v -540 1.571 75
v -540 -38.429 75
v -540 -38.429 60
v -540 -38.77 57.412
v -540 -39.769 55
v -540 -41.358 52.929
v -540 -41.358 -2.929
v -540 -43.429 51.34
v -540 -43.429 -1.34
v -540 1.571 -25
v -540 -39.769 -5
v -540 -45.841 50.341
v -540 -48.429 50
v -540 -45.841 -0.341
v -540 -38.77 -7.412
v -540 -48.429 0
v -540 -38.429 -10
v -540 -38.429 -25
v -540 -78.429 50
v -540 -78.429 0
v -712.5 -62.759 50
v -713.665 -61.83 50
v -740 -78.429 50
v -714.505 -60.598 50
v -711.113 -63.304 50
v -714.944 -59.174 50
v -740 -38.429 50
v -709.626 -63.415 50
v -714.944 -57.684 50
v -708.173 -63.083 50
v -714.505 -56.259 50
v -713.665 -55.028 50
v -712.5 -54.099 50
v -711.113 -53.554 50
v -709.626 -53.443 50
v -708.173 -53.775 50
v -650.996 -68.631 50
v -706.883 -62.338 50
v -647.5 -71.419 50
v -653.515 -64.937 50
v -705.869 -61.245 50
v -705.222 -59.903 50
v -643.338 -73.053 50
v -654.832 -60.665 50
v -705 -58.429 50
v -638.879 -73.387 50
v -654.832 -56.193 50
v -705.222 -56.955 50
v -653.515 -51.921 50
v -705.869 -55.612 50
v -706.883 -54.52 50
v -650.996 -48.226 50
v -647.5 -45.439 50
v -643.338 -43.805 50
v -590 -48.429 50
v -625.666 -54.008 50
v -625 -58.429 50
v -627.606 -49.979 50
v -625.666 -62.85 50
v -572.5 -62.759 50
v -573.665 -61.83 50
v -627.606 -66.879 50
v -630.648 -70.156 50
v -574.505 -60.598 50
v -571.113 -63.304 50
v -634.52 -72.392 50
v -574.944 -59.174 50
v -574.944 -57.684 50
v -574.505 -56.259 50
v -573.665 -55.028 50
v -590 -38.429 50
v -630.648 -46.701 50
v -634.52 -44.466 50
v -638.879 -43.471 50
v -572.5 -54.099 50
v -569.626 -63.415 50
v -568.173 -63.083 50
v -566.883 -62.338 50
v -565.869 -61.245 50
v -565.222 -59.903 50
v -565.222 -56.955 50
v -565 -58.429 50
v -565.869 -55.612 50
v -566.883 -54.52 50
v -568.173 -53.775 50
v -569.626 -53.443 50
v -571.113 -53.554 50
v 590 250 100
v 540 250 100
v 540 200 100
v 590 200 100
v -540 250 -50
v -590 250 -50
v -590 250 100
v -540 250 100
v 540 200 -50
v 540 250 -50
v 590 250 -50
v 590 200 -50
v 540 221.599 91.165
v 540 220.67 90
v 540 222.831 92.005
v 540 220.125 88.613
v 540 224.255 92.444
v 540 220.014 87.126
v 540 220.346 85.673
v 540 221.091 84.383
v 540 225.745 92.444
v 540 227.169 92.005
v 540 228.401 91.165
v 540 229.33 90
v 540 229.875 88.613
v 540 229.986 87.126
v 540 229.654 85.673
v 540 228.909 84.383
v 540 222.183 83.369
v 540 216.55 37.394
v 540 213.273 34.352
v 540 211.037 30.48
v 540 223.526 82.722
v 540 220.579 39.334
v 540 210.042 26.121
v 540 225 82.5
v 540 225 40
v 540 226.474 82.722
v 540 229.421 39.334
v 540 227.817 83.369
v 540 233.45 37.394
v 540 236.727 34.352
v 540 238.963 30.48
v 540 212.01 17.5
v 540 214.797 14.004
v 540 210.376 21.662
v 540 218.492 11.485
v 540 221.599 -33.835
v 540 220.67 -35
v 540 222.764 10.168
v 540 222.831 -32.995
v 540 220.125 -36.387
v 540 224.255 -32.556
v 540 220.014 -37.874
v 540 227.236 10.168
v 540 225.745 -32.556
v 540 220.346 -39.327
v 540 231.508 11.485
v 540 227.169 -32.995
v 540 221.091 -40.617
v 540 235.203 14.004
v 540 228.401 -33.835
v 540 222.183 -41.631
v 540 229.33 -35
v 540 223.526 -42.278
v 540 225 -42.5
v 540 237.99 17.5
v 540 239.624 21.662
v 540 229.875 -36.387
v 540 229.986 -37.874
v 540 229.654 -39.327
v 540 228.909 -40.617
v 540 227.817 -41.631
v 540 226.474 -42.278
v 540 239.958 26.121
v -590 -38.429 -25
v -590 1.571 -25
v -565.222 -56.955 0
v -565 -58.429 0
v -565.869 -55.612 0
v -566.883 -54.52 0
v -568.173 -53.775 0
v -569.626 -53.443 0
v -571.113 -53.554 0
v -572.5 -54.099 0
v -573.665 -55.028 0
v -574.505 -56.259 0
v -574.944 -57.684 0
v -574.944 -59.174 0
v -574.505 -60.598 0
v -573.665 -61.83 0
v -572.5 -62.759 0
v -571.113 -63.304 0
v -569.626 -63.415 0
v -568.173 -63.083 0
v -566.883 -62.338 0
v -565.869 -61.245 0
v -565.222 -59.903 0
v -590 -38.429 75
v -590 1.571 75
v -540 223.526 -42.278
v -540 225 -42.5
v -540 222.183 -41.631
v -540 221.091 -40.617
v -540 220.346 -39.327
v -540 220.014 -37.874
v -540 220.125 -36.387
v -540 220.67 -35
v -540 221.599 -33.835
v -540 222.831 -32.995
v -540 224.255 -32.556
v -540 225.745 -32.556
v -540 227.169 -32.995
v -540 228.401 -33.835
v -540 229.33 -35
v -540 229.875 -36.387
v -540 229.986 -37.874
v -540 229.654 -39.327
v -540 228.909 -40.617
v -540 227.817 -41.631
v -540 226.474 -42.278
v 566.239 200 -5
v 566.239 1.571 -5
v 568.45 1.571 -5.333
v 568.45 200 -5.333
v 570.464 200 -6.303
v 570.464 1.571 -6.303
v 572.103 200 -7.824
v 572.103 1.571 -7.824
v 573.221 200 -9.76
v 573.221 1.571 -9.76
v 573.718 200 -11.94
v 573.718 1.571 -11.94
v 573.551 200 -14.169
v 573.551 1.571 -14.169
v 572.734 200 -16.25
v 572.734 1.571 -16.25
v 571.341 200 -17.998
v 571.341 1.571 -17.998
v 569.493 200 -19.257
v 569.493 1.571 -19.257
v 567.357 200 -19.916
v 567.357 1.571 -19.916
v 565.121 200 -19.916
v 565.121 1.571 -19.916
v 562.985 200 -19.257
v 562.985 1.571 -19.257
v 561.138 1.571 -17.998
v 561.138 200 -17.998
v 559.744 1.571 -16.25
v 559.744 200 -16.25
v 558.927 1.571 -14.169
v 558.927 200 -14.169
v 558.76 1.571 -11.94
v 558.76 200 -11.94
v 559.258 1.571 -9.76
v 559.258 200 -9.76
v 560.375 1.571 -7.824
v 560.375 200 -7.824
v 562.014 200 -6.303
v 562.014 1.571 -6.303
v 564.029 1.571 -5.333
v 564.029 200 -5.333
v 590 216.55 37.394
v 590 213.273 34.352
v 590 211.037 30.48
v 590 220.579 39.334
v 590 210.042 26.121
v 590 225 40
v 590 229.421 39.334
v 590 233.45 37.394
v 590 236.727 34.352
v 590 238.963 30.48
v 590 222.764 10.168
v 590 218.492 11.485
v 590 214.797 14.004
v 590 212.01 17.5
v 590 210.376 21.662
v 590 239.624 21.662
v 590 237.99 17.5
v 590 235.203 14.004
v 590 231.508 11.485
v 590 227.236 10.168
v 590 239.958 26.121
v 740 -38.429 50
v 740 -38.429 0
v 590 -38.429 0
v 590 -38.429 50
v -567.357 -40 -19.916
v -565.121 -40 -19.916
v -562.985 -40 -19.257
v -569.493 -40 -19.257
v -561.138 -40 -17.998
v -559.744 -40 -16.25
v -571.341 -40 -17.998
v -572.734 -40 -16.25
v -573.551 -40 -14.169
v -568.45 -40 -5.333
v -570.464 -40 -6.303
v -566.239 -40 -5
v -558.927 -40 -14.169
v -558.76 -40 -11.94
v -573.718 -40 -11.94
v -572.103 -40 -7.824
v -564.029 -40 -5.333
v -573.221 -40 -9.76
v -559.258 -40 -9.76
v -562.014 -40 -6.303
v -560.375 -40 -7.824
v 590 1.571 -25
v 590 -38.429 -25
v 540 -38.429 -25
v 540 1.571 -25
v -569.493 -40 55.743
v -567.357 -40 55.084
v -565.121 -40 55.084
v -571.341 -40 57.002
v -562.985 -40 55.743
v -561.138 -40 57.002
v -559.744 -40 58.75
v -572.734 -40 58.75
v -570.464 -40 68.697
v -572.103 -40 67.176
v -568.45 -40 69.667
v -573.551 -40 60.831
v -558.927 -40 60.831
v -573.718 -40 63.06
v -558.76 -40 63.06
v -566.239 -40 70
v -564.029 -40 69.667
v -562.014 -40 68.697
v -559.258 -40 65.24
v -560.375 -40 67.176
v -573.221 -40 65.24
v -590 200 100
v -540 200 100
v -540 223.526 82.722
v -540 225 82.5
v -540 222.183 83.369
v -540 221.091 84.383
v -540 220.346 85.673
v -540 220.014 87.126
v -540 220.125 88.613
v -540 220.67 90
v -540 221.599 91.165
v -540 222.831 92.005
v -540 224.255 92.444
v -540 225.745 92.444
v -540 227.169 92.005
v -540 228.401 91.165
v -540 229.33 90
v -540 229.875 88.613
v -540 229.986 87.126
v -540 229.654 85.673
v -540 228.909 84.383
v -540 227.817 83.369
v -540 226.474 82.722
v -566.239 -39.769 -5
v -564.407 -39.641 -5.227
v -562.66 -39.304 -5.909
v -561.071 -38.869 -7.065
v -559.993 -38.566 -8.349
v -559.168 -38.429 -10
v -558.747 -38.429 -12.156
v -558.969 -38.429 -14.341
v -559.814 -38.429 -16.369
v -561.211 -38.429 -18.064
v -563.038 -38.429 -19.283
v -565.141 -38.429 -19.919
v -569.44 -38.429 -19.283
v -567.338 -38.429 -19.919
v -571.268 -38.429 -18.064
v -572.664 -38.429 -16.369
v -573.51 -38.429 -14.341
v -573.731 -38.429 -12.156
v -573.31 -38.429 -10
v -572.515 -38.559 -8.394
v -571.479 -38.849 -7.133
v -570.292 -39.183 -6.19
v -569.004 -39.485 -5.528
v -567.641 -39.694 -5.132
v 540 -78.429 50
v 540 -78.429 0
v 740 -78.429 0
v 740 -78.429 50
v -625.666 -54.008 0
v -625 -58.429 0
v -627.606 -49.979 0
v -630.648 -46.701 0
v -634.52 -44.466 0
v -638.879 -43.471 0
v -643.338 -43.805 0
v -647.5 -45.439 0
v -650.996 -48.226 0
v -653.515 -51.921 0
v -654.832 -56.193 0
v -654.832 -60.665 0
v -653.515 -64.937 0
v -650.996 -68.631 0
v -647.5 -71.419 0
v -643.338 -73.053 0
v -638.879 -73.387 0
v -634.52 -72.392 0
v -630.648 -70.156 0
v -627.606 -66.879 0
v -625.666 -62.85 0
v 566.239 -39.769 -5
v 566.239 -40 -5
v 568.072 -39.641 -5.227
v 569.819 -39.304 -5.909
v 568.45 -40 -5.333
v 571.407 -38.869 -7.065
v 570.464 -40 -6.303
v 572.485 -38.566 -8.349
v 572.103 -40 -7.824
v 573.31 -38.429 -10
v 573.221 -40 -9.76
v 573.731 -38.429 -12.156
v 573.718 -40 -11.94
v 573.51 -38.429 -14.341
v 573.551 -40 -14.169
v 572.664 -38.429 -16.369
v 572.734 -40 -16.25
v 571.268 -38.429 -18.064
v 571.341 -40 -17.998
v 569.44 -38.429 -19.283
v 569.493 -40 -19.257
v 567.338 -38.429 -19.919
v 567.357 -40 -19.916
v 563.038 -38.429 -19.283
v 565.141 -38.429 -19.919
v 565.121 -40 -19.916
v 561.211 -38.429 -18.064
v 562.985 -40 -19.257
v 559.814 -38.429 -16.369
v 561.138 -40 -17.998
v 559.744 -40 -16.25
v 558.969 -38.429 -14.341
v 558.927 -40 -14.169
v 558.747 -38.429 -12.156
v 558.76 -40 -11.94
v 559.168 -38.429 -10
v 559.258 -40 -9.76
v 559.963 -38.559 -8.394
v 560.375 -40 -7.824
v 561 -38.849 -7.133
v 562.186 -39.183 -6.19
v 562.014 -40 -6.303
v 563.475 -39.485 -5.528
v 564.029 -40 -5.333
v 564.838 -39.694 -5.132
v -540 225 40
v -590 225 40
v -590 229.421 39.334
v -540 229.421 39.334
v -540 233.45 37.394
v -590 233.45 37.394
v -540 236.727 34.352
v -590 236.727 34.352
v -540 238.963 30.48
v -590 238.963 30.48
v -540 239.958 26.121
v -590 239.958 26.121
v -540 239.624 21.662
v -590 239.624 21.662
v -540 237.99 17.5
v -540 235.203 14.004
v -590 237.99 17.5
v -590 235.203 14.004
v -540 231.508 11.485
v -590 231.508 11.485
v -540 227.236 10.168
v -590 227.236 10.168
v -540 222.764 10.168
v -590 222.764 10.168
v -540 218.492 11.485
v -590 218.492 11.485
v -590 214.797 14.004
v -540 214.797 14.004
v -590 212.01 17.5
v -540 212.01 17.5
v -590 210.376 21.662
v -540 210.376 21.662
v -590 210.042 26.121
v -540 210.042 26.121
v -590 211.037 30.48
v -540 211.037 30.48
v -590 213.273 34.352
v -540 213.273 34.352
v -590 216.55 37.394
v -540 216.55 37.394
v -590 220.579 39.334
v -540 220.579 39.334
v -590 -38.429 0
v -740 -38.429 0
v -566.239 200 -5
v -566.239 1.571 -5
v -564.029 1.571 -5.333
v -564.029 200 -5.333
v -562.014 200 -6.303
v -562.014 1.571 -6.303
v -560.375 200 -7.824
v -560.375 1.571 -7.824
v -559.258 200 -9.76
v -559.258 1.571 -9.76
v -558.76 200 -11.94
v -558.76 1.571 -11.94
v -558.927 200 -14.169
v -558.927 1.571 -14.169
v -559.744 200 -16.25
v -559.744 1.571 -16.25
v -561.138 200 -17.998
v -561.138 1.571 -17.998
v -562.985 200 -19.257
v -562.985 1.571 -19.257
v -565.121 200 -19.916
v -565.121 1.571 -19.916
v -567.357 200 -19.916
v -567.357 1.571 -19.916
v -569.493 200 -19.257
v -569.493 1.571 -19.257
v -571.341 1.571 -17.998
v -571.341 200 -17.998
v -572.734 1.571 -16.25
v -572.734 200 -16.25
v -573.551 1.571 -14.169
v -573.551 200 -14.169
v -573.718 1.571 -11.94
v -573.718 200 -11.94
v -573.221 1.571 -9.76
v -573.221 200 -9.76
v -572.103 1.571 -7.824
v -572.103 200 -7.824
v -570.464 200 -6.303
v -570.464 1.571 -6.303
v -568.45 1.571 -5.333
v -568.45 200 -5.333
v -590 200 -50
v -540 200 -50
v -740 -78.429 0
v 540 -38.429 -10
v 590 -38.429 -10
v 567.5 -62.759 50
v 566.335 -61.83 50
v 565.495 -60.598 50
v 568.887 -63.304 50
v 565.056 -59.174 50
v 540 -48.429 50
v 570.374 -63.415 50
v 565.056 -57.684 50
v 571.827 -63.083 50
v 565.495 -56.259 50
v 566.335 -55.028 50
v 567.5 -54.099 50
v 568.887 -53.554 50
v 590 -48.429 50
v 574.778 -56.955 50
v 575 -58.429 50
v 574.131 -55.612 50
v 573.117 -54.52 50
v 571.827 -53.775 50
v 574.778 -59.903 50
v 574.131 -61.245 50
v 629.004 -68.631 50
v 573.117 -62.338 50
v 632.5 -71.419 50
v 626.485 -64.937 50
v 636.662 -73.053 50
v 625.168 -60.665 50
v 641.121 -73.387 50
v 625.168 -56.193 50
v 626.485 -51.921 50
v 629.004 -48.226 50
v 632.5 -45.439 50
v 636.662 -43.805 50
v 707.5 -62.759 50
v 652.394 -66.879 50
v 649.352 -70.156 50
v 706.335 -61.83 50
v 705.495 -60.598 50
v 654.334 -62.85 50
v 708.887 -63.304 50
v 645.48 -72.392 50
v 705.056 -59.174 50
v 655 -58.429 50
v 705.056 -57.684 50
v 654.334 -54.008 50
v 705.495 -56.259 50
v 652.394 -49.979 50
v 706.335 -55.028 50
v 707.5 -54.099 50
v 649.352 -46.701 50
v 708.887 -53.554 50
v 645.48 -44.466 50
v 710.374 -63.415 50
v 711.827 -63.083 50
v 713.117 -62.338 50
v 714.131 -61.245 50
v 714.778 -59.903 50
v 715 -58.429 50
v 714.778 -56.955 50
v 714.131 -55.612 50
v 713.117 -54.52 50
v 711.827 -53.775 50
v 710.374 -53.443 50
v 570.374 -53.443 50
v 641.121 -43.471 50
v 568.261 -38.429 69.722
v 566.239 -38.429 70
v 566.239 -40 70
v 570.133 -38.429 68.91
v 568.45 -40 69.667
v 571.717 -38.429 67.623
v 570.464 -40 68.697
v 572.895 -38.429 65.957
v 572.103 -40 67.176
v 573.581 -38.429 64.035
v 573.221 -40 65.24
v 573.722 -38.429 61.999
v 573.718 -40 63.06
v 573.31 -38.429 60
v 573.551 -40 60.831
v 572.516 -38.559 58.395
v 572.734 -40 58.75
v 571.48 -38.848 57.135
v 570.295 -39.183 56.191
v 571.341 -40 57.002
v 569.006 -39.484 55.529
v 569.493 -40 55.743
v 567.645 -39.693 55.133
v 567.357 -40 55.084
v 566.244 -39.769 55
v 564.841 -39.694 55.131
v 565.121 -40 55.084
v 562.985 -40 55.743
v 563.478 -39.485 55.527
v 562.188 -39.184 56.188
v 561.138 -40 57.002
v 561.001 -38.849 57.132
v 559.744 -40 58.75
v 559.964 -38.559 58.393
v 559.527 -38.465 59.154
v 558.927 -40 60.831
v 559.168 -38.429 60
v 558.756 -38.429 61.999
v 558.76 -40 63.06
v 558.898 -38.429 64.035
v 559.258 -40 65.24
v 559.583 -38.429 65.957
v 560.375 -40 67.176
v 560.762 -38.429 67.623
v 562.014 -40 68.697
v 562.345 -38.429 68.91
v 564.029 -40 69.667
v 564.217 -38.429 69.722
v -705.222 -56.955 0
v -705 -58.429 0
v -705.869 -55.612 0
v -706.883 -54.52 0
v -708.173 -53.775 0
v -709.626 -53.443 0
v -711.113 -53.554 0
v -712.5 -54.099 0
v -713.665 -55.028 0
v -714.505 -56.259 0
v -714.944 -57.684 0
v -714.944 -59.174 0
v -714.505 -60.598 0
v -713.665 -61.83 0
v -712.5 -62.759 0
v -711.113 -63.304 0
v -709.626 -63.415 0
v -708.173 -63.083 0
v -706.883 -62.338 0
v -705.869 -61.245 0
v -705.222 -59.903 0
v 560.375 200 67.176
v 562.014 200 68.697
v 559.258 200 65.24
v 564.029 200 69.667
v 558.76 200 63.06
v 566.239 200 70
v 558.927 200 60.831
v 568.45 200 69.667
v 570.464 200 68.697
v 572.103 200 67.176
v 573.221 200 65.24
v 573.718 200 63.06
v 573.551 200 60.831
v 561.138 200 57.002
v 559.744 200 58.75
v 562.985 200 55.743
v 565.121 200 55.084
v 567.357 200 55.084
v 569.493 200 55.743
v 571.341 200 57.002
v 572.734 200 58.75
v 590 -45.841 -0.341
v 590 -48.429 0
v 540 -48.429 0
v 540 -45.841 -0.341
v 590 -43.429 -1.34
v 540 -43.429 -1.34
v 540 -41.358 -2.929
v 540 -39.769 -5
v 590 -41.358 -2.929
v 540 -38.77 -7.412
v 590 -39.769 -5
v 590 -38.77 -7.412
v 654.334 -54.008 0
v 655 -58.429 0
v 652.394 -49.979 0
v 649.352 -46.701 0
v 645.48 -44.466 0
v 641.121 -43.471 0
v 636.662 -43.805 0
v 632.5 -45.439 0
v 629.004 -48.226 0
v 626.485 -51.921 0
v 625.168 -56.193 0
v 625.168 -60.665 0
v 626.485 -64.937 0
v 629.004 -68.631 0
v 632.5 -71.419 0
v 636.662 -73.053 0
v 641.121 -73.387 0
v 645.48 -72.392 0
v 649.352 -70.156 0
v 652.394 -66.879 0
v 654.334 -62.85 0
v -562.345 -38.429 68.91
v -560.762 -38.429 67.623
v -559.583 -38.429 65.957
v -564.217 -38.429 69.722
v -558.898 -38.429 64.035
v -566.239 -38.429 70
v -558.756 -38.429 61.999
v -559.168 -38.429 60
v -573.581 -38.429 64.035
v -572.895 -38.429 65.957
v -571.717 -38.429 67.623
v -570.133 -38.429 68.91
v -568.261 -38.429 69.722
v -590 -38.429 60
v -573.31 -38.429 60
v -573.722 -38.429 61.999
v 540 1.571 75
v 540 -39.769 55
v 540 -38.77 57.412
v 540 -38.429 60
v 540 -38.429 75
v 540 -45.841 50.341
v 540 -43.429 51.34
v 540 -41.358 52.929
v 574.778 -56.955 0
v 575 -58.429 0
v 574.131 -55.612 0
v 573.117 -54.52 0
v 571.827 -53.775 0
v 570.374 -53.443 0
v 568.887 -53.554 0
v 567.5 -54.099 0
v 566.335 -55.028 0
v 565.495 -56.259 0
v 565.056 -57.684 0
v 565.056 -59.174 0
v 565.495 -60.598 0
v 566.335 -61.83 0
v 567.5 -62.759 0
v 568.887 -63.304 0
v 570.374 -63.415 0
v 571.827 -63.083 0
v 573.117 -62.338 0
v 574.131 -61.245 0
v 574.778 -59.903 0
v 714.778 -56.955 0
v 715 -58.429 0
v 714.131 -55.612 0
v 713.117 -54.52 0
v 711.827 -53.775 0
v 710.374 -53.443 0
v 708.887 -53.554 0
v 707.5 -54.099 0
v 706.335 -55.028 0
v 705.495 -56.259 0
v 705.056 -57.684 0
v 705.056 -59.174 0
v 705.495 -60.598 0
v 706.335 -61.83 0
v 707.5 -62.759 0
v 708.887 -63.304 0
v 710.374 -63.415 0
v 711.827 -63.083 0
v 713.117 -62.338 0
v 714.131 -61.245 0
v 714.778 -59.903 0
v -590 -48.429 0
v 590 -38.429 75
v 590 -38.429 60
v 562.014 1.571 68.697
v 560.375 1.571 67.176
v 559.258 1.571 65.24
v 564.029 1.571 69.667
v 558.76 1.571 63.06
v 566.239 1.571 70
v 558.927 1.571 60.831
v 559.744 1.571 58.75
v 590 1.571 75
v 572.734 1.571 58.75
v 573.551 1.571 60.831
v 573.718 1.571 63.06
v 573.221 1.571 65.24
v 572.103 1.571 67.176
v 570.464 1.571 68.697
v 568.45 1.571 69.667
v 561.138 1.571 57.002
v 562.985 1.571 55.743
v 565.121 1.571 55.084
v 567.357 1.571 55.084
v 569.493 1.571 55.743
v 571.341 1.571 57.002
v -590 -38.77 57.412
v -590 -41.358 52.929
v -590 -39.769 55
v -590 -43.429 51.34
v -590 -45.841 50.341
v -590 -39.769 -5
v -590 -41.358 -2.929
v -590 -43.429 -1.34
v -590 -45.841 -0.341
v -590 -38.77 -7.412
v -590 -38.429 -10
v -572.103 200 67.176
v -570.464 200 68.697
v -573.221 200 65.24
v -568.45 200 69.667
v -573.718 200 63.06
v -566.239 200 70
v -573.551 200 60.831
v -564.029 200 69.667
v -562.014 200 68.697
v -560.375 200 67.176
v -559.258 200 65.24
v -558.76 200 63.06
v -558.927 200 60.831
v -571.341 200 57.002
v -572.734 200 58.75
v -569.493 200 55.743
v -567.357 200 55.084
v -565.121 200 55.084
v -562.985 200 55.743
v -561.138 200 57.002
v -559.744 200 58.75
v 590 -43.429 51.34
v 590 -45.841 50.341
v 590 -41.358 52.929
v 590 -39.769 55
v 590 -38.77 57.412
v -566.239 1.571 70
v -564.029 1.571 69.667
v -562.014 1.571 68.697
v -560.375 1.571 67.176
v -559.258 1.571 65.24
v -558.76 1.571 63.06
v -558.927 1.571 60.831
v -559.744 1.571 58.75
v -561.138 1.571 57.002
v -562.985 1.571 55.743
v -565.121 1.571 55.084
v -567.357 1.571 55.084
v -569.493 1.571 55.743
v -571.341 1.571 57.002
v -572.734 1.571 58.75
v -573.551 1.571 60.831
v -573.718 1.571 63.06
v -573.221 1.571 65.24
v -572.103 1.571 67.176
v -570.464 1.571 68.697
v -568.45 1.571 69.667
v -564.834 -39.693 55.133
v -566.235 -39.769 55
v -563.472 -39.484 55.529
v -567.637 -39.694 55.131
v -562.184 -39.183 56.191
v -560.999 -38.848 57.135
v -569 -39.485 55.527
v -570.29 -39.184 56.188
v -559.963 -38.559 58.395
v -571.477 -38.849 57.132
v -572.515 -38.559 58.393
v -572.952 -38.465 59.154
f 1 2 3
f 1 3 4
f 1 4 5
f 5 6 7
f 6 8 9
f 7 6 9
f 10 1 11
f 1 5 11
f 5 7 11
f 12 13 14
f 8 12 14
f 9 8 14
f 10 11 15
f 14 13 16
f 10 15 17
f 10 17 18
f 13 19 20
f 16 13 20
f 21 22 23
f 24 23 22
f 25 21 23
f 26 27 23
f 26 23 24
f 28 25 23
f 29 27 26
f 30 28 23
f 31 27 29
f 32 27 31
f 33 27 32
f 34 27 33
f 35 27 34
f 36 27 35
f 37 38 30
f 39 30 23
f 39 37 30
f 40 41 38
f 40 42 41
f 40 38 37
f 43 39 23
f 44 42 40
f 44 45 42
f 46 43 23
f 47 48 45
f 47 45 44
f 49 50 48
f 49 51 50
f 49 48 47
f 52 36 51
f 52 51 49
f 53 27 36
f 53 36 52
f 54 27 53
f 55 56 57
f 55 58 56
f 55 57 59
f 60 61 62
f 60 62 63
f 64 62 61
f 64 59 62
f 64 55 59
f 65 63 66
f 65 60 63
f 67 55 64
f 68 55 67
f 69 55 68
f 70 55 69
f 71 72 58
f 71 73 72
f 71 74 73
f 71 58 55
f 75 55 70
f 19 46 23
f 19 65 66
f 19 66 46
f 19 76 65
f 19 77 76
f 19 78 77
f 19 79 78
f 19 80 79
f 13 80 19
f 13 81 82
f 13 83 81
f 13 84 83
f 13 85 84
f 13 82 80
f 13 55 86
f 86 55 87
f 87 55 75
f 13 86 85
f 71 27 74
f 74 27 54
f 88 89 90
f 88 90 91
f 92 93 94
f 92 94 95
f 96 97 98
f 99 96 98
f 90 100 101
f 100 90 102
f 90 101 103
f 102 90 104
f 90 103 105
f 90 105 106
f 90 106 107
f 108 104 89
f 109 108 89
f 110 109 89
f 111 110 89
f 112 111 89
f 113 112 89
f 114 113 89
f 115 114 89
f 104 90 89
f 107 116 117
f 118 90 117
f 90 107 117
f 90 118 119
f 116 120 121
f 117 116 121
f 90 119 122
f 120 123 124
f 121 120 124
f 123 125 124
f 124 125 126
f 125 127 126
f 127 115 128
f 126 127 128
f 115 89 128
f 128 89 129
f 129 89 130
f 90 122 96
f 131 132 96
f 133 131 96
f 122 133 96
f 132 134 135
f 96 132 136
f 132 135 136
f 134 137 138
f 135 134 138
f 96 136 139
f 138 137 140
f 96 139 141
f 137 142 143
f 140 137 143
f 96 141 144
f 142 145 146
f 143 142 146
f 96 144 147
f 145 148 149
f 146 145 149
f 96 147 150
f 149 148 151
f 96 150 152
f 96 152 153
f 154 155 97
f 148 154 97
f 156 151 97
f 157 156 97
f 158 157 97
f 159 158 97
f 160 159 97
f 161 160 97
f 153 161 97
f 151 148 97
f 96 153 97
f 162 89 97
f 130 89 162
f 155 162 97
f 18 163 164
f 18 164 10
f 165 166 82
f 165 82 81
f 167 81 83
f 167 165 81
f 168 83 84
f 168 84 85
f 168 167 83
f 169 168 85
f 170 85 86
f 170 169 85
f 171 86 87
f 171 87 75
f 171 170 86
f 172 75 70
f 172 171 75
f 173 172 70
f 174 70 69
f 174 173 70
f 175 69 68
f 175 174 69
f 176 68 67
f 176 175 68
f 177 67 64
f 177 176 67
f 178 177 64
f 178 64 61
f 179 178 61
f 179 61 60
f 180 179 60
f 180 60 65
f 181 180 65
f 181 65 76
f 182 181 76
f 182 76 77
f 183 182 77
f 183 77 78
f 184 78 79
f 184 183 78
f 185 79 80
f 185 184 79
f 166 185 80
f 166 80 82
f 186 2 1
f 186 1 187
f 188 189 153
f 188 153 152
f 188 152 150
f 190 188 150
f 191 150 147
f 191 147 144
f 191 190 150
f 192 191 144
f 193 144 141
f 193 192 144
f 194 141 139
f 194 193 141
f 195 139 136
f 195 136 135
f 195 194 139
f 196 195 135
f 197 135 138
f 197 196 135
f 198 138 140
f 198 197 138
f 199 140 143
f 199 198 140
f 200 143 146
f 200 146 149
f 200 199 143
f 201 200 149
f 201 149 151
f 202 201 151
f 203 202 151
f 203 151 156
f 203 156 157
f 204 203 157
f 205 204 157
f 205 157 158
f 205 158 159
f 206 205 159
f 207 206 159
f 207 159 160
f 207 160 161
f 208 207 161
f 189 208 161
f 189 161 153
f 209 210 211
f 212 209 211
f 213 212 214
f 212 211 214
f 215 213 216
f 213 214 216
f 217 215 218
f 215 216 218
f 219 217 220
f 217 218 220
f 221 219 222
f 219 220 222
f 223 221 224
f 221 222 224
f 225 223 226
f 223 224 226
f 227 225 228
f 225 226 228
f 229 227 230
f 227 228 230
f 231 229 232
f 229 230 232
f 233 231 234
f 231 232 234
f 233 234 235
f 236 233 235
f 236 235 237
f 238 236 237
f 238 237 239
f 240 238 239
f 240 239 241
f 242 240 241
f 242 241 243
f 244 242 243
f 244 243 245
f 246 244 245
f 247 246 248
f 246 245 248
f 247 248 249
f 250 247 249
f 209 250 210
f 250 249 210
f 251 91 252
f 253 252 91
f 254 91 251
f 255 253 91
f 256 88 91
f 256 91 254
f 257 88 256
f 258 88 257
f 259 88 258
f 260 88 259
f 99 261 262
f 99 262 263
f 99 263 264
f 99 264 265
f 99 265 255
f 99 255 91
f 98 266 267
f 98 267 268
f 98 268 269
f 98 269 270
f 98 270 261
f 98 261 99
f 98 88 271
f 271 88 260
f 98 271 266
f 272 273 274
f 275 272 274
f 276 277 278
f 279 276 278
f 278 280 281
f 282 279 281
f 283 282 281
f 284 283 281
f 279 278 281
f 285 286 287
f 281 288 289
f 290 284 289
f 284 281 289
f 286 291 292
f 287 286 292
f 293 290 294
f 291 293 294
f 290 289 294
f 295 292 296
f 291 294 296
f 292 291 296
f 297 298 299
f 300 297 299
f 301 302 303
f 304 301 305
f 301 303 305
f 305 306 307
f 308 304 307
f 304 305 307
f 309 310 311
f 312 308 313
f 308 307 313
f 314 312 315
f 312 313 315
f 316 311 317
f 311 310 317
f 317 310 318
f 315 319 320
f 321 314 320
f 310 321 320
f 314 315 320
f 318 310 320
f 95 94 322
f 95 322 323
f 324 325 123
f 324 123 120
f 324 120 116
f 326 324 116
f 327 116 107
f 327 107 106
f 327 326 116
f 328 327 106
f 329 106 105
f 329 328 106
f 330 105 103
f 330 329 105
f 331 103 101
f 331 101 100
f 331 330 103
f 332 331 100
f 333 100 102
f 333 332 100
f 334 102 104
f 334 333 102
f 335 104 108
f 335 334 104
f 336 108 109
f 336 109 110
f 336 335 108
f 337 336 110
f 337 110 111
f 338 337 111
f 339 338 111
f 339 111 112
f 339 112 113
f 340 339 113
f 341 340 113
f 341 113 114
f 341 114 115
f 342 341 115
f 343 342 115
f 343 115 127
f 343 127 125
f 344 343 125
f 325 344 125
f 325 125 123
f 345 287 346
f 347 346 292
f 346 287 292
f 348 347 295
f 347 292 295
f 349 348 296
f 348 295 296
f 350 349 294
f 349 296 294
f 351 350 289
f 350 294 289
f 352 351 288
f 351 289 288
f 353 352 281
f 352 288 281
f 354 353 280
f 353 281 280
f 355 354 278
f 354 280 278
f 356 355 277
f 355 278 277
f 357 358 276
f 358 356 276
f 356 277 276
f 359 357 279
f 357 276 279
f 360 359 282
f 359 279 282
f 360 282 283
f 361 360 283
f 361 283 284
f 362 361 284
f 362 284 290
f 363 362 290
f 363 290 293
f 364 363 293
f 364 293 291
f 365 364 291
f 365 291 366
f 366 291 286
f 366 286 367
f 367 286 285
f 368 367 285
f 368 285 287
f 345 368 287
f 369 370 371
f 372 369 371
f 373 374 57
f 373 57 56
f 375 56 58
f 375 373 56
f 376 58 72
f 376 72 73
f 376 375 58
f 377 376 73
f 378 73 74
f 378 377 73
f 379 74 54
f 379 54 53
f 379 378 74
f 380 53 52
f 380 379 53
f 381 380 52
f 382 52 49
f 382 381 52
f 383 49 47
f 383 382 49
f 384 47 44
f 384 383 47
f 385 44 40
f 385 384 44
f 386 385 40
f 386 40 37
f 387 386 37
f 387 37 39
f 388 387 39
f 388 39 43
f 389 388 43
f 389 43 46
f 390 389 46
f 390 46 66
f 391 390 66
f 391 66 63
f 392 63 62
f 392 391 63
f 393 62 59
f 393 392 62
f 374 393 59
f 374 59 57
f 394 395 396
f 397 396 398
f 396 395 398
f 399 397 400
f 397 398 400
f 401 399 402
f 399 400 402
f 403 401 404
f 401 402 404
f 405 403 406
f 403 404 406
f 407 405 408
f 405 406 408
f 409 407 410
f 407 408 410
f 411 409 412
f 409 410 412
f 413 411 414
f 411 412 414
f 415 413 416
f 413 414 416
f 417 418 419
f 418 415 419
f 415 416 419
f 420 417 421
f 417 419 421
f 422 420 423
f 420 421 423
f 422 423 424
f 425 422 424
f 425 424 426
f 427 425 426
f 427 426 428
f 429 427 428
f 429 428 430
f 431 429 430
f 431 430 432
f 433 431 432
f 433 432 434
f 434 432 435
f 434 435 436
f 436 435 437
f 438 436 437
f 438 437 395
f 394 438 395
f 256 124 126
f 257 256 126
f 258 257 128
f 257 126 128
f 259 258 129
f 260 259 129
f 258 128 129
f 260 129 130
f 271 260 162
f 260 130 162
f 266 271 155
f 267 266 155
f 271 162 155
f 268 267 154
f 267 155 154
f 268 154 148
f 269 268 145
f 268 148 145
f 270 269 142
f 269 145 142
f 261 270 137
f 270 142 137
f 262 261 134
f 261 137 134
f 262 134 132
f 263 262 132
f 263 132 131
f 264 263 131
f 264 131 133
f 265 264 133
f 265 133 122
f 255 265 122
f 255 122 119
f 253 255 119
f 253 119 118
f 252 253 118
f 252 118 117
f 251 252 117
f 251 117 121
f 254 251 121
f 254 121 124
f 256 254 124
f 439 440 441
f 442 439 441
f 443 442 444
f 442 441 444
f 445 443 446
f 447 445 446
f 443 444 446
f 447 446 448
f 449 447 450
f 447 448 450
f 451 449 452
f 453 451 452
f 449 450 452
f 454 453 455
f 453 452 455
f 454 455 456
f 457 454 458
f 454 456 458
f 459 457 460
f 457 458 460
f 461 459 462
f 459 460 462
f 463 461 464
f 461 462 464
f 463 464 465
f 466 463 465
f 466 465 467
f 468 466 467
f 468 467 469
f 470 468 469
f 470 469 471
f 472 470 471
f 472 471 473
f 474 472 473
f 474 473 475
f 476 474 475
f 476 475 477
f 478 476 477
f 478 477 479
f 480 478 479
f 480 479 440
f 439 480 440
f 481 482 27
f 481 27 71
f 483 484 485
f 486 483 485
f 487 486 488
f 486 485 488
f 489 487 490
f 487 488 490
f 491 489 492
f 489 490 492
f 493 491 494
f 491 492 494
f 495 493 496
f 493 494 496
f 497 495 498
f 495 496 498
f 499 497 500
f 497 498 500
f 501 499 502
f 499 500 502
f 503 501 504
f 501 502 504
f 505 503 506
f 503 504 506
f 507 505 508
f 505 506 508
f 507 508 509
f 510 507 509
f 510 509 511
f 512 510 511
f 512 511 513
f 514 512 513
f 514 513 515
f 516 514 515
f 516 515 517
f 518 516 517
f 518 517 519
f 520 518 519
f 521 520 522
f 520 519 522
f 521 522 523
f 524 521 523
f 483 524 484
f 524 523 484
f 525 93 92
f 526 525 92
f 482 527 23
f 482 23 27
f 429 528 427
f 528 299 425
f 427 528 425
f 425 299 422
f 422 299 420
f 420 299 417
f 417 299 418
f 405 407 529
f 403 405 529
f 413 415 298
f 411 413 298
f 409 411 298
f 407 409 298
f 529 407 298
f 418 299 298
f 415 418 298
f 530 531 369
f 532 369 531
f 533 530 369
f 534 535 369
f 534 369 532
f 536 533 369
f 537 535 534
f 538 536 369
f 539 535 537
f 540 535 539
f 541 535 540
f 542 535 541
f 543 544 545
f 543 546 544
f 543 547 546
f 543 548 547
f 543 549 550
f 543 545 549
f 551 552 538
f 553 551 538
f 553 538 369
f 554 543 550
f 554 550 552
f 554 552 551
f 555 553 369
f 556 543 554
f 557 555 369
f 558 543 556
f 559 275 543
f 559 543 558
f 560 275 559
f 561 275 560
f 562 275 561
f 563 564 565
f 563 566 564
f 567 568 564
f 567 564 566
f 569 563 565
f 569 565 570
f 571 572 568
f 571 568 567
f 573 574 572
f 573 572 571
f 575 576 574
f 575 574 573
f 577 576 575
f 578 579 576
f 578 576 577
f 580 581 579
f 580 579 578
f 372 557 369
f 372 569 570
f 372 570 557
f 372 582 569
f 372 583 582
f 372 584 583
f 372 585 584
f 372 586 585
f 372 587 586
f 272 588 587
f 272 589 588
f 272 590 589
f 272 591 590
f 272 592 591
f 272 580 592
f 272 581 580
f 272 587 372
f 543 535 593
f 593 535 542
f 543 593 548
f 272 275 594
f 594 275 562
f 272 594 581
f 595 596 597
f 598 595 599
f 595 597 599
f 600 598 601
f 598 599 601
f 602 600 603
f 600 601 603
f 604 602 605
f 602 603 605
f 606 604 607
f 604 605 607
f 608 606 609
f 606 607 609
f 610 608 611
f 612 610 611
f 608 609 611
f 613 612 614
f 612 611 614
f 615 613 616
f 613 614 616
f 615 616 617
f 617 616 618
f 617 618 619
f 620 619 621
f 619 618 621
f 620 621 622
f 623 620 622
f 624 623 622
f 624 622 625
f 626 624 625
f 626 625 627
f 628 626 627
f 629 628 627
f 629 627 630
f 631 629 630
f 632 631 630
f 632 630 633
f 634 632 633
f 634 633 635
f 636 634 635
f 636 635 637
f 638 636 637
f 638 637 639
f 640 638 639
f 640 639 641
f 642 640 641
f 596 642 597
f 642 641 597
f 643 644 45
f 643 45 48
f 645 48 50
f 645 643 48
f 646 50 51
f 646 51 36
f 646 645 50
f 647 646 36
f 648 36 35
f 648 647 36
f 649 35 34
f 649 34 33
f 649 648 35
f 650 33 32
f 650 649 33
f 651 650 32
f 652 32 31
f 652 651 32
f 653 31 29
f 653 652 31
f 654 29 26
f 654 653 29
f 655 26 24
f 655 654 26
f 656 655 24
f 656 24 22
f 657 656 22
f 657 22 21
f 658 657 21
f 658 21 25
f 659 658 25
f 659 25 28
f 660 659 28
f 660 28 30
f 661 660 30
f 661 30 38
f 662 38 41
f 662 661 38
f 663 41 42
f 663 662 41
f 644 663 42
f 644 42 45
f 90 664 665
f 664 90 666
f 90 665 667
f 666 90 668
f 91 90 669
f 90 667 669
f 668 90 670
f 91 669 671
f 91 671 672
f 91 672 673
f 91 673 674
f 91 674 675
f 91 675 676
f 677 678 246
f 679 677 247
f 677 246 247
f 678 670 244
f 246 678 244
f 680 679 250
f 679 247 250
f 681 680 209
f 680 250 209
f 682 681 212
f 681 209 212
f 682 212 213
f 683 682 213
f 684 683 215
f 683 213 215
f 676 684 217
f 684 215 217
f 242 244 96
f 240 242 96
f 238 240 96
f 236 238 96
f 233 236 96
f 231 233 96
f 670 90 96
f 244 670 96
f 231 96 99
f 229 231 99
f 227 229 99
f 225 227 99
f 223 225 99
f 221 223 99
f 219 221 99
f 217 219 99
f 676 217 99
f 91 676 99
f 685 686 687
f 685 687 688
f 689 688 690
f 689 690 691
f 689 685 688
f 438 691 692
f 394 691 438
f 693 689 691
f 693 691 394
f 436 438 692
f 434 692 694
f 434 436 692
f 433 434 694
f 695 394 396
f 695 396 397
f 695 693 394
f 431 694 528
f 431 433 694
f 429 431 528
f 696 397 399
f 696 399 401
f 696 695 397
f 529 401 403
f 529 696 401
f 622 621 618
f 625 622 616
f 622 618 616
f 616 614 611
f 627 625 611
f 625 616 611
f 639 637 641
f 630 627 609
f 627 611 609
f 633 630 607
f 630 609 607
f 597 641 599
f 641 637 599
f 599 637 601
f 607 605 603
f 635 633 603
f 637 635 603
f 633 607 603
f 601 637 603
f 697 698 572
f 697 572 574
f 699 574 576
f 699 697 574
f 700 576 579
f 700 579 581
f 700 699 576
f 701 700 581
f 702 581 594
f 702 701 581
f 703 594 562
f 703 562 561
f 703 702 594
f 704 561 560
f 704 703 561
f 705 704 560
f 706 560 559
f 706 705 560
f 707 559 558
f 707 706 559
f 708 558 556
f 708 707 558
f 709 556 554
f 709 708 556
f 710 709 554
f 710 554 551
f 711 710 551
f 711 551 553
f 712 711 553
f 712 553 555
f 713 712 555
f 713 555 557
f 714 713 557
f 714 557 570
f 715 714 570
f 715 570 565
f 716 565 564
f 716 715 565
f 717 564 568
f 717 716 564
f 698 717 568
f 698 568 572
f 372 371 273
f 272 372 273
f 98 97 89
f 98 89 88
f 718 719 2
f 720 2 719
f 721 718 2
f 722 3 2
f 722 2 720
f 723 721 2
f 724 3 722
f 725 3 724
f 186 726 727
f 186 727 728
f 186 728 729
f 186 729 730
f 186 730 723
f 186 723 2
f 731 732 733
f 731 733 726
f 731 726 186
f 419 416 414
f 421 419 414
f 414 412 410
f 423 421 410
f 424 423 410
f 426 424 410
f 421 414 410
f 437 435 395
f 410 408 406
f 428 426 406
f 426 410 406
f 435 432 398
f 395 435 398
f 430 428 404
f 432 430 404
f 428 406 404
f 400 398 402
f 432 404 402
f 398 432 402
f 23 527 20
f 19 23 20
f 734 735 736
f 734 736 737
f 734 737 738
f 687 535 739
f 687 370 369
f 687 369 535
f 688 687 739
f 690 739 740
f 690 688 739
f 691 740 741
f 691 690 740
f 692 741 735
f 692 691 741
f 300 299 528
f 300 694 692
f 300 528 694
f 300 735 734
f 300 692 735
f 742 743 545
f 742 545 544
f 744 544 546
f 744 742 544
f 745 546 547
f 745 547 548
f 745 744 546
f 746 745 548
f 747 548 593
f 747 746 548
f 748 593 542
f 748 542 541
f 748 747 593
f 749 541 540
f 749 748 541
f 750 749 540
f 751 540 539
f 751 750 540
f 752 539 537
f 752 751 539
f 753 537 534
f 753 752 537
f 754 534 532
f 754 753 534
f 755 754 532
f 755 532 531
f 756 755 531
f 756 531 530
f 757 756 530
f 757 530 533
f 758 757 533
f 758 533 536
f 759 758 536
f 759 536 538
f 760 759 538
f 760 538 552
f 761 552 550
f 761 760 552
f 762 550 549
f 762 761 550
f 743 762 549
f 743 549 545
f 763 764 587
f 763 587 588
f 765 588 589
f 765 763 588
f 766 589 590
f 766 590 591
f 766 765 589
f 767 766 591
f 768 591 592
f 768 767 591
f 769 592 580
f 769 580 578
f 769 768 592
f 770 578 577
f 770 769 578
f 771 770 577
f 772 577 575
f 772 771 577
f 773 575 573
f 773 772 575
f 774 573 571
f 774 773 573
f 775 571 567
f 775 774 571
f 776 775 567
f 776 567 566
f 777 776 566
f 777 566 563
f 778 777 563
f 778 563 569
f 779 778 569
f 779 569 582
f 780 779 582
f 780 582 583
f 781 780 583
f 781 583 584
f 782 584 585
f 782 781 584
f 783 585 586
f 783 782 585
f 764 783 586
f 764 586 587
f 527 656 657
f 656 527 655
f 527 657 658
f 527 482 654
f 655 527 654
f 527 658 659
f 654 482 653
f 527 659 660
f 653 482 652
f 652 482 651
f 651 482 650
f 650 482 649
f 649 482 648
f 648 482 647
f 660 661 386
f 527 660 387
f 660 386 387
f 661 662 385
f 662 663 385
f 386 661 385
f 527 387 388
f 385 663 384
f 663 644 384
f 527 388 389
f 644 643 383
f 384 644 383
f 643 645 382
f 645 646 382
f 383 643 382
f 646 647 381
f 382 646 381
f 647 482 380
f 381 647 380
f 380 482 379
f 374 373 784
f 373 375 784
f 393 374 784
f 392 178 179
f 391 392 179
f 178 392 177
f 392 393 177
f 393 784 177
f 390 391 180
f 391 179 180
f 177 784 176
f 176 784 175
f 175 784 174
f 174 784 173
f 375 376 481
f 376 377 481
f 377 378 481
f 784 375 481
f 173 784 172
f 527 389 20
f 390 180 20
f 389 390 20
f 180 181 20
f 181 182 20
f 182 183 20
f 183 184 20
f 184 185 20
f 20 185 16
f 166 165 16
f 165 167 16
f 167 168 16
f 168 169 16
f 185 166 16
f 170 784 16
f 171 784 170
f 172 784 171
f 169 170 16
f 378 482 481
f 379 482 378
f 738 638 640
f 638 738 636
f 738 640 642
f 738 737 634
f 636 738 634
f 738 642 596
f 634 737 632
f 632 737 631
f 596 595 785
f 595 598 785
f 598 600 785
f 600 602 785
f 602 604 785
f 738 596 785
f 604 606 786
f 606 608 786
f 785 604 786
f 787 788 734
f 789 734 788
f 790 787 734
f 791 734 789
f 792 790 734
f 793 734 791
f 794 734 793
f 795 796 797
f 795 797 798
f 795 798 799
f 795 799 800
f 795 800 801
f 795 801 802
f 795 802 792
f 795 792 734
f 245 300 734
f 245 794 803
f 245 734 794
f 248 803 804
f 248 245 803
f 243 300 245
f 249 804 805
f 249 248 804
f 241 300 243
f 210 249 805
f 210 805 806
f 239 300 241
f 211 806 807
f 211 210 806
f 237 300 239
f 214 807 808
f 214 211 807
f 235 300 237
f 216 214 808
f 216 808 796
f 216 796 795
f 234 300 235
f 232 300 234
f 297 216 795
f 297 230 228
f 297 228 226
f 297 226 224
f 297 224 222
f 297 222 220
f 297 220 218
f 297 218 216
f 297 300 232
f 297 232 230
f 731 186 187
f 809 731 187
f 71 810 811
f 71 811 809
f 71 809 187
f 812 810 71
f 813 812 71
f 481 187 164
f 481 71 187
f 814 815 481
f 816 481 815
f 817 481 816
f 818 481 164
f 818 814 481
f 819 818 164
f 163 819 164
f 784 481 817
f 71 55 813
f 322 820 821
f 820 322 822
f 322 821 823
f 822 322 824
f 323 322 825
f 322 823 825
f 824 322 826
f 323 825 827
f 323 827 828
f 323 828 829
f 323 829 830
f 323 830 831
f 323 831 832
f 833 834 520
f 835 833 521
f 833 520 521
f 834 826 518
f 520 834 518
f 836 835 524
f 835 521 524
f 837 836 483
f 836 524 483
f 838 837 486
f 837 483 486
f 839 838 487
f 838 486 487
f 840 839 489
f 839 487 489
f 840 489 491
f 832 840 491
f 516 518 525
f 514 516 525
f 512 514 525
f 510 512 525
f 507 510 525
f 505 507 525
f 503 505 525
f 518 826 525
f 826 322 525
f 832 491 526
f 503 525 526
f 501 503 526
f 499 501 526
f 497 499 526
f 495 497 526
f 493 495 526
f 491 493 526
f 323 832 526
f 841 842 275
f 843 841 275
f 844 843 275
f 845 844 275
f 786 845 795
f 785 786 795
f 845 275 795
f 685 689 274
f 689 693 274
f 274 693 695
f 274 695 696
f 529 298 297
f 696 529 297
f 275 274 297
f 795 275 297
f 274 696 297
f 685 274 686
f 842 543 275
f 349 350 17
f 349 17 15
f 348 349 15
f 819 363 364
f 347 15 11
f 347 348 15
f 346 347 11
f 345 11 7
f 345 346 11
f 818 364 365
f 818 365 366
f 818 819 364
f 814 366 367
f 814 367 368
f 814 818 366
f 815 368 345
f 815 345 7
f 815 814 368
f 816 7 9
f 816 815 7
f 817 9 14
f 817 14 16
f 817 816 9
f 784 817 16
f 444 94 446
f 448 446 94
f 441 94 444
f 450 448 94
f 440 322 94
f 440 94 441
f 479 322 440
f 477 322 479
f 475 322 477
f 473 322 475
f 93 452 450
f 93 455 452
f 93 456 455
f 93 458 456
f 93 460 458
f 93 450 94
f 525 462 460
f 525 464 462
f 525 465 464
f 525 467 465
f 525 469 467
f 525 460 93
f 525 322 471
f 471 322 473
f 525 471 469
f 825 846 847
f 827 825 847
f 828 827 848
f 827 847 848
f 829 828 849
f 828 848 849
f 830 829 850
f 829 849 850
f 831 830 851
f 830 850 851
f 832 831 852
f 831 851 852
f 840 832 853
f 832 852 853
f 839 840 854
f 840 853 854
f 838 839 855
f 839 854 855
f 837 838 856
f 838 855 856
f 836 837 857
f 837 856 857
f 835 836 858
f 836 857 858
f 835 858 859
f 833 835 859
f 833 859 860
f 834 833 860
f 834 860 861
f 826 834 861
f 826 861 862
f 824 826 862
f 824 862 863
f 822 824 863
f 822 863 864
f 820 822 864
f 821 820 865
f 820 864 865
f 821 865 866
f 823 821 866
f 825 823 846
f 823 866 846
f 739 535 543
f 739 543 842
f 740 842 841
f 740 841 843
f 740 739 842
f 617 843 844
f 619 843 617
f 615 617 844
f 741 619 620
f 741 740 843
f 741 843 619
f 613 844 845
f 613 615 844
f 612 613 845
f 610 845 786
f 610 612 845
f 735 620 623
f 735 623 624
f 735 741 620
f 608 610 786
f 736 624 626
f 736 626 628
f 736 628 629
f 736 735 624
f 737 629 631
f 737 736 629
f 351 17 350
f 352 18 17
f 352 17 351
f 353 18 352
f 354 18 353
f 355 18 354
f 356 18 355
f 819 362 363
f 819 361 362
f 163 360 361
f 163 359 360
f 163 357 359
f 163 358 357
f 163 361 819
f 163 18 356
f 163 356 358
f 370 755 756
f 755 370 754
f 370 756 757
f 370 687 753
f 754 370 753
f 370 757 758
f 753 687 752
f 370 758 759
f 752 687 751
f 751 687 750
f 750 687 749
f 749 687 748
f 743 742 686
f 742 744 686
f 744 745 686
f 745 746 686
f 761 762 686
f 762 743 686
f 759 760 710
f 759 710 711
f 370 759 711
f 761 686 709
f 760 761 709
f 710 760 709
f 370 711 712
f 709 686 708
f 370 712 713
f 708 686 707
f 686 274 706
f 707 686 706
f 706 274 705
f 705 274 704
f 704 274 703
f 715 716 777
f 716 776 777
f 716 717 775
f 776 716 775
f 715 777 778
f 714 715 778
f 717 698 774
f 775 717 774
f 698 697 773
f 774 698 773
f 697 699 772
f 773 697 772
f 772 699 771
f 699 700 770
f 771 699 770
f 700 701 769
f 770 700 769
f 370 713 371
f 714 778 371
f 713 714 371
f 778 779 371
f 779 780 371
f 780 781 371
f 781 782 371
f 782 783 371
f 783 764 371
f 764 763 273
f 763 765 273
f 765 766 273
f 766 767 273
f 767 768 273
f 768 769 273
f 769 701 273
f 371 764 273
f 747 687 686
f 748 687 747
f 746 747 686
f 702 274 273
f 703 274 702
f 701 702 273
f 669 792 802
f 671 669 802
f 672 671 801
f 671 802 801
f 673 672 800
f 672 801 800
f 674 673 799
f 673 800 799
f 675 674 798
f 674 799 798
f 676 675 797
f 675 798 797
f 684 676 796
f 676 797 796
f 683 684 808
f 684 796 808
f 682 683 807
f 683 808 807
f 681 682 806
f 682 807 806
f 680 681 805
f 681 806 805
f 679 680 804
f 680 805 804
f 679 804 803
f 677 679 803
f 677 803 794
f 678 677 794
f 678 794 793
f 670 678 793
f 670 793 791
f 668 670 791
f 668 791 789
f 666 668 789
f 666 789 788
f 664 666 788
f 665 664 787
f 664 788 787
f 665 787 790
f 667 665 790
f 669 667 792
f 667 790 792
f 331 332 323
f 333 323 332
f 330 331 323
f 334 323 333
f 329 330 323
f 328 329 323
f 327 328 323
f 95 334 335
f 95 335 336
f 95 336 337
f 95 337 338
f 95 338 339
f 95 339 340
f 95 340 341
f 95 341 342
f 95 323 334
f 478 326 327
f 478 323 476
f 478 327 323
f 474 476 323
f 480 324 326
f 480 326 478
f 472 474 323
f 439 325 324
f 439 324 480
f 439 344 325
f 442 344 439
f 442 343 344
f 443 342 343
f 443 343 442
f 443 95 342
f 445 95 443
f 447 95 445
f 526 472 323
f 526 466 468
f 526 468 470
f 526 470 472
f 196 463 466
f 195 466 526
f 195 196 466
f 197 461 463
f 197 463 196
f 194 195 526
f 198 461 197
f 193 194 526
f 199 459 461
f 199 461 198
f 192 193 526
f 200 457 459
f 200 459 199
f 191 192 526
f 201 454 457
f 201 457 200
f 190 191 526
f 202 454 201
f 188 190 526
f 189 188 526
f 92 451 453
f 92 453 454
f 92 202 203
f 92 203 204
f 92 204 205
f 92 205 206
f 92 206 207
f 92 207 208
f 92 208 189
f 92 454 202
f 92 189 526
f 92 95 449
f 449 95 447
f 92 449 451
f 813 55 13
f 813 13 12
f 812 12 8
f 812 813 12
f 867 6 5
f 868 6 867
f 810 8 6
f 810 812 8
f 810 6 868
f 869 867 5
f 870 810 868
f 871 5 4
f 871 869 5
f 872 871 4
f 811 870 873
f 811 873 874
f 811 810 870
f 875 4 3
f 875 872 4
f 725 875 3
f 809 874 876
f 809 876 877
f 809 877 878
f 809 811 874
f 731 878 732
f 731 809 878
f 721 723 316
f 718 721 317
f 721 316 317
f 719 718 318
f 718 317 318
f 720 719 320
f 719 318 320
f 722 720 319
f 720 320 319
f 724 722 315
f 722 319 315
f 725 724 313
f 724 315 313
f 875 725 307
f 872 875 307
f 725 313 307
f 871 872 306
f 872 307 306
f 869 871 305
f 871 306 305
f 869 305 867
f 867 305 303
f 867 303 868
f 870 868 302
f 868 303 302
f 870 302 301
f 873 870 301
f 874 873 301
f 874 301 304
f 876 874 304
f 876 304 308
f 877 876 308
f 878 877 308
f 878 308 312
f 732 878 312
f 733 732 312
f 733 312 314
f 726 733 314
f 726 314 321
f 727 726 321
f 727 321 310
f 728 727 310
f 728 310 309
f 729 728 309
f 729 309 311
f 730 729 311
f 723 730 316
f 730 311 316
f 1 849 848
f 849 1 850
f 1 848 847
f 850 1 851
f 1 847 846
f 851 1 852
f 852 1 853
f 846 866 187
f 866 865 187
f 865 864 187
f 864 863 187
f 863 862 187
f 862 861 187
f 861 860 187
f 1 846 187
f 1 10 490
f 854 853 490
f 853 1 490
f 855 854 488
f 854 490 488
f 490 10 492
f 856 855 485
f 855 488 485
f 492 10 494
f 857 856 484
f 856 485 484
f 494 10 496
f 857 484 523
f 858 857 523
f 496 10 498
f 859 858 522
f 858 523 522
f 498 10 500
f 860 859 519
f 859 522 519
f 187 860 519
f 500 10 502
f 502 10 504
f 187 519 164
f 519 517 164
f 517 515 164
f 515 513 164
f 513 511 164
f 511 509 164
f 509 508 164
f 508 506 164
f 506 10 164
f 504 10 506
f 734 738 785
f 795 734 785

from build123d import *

# Parameters (mm, degrees)
SKETCH1_W                = 200
SKETCH1_H                = 40
SKETCH1_R                = 5
SKETCH1_R_2              = 15
BOSS_EXTRUDE2_DEPTH      = 50
BOSS_EXTRUDE2_2_DEPTH    = 50
SKETCH2_R                = 7.5
BOSS_EXTRUDE4_DEPTH      = 40
BOSS_EXTRUDE5_DEPTH      = 250
BOSS_EXTRUDE5_DEPTH_BACK = 40
SKETCH3_R                = 7.5
SKETCH4_W                = 50
SKETCH4_H                = 100
BOSS_EXTRUDE6_DEPTH      = 50
SKETCH5_R                = 15
CUT_EXTRUDE1_DEPTH       = 1180
SKETCH6_W                = 50
SKETCH6_H                = 25
BOSS_EXTRUDE8_DEPTH      = 50
SKETCH7_R                = 5
BOSS_EXTRUDE9_DEPTH      = 1180
FILLET1_R                = 10


with BuildPart() as part:
    # Sketch1 → Boss-Extrude2 (new body)
    with BuildSketch(Plane.XY):
        with Locations((-640, -58.42888126)):
            Rectangle(SKETCH1_W, SKETCH1_H)
        with Locations((-710, -58.42888126)):
            Circle(SKETCH1_R, mode=Mode.SUBTRACT)
        with Locations((-570, -58.42888126)):
            Circle(SKETCH1_R, mode=Mode.SUBTRACT)
        with Locations((-640, -58.42888126)):
            Circle(SKETCH1_R_2, mode=Mode.SUBTRACT)
    extrude(amount=BOSS_EXTRUDE2_DEPTH)



with BuildPart() as body_2:
    # Sketch1 → Boss-Extrude2 2 (new body)
    with BuildSketch(Plane.XY):
        Polygon((580, -38.42888126), (540, -38.42888126), (540, -78.42888126), (740, -78.42888126), (740, -38.42888126), align=None)
        with Locations((570, -58.42888126)):
            Circle(SKETCH1_R, mode=Mode.SUBTRACT)
        with Locations((640, -58.42888126)):
            Circle(SKETCH1_R_2, mode=Mode.SUBTRACT)
        with Locations((710, -58.42888126)):
            Circle(SKETCH1_R, mode=Mode.SUBTRACT)
    extrude(amount=BOSS_EXTRUDE2_2_DEPTH)


with BuildPart() as part_1:
    add(part.part)

    add(body_2.part)  # Boss-Extrude4 merges body 2
    # Sketch2 → Boss-Extrude4 (add)
    # profile 1 of 2: a face of its own
    with BuildSketch(Plane(origin=(0, -38.42888126, 0), x_dir=(1, 0, 0), z_dir=(0, 1, 0))):
        Polygon((540, -25), (540, -75), (590, -75), (590, -25), (590, 25), (540, 25), align=None)
        with Locations(Location((566.239219394, 12.5, 0), (0, 0, 180))):
            Circle(SKETCH2_R, mode=Mode.SUBTRACT)
        with Locations(Location((566.239219394, -62.5, 0), (0, 0, 180))):
            Circle(SKETCH2_R, mode=Mode.SUBTRACT)
    # profile 2 of 2: a face of its own
    with BuildSketch(Plane(origin=(0, -38.42888126, 0), x_dir=(1, 0, 0), z_dir=(0, 1, 0))):
        Polygon((-590, -25), (-590, 25), (-540, 25), (-540, -25), (-540, -75), (-590, -75), align=None)
        with Locations(Location((-566.239219394, -62.5, 0), (0, 0, 180))):
            Circle(SKETCH2_R, mode=Mode.SUBTRACT)
        with Locations(Location((-566.239219394, 12.5, 0), (0, 0, 180))):
            Circle(SKETCH2_R, mode=Mode.SUBTRACT)
    extrude(amount=BOSS_EXTRUDE4_DEPTH)

    # Sketch3 → Boss-Extrude5 (add, two sides: drawn at the far end of the back side and taken through both)
    with BuildSketch(Plane(origin=(0, 0, 0), x_dir=(1, 0, 0), z_dir=(0, 1, 0)).offset(-BOSS_EXTRUDE5_DEPTH_BACK)):
        with Locations(Location((-566.239219394, 12.5, 0), (0, 0, 270))):
            Circle(SKETCH3_R)
        with Locations(Location((-566.239219394, -62.5, 0), (0, 0, 270))):
            Circle(SKETCH3_R)
        with Locations(Location((566.239219394, 12.5, 0), (0, 0, 270))):
            Circle(SKETCH3_R)
        with Locations(Location((566.239219394, -62.5, 0), (0, 0, 270))):
            Circle(SKETCH3_R)
    extrude(amount=BOSS_EXTRUDE5_DEPTH + BOSS_EXTRUDE5_DEPTH_BACK)

    # Sketch4 → Boss-Extrude6 (add)
    with BuildSketch(Plane(origin=(0, 250, 0), x_dir=(1, 0, 0), z_dir=(0, 1, 0))):
        with Locations((565, -25)):
            Rectangle(SKETCH4_W, SKETCH4_H)
        with Locations((-565, -25)):
            Rectangle(SKETCH4_W, SKETCH4_H)
    extrude(amount=-BOSS_EXTRUDE6_DEPTH)

    # Sketch5 → Cut-Extrude1 (cut)
    with BuildSketch(Plane.ZY.offset(590)):
        with Locations((25, 225)):
            Circle(SKETCH5_R)
    extrude(amount=-CUT_EXTRUDE1_DEPTH, mode=Mode.SUBTRACT)

    # Sketch6 → Boss-Extrude8 (add)
    with BuildSketch(Plane(origin=(0, 250, 0), x_dir=(1, 0, 0), z_dir=(0, 1, 0))):
        with Locations((565, -87.5)):
            Rectangle(SKETCH6_W, SKETCH6_H)
        with Locations((565, 37.5)):
            Rectangle(SKETCH6_W, SKETCH6_H)
        with Locations((-565, -87.5)):
            Rectangle(SKETCH6_W, SKETCH6_H)
        with Locations((-565, 37.5)):
            Rectangle(SKETCH6_W, SKETCH6_H)
    extrude(amount=-BOSS_EXTRUDE8_DEPTH)

    # Sketch7 → Boss-Extrude9 (add)
    with BuildSketch(Plane.ZY.offset(590)):
        with Locations(Location((87.5, 225, 0), (0, 0, 180))):
            Circle(SKETCH7_R)
        with Locations(Location((-37.5, 225, 0), (0, 0, 180))):
            Circle(SKETCH7_R)
    extrude(amount=-BOSS_EXTRUDE9_DEPTH)

    # Fillet1
    # the kernel refuses this fillet: 10 mm, written as the material it adds along each edge
    with BuildSketch(Plane(origin=(540, -38.42888126, 50), x_dir=(0, -1, 0), z_dir=(1, 0, 0)), Plane(origin=(590, -38.42888126, 0), x_dir=(0, -1, 0), z_dir=(-1, 0, 0)), Plane(origin=(-590, -38.42888126, 0), x_dir=(0, 0, -1), z_dir=(1, 0, 0))) as fillet1_piece_1:
        with BuildLine():
            CenterArc((FILLET1_R, -FILLET1_R), FILLET1_R, 90, 90)
            Line((0, -FILLET1_R), (0, 0))
            Line((0, 0), (FILLET1_R, 0))
        make_face()
    extrude(amount=50)
    with BuildSketch(Plane(origin=(-590, -38.42888126, 50), x_dir=(0, 0, 1), z_dir=(1, 0, 0))) as fillet1_piece_2:
        with BuildLine():
            CenterArc((FILLET1_R, FILLET1_R), FILLET1_R, 180, 90)
            Line((0, FILLET1_R), (0, 0))
            Line((0, 0), (FILLET1_R, 0))
        make_face()
    extrude(amount=50)


solid = part_1.part
